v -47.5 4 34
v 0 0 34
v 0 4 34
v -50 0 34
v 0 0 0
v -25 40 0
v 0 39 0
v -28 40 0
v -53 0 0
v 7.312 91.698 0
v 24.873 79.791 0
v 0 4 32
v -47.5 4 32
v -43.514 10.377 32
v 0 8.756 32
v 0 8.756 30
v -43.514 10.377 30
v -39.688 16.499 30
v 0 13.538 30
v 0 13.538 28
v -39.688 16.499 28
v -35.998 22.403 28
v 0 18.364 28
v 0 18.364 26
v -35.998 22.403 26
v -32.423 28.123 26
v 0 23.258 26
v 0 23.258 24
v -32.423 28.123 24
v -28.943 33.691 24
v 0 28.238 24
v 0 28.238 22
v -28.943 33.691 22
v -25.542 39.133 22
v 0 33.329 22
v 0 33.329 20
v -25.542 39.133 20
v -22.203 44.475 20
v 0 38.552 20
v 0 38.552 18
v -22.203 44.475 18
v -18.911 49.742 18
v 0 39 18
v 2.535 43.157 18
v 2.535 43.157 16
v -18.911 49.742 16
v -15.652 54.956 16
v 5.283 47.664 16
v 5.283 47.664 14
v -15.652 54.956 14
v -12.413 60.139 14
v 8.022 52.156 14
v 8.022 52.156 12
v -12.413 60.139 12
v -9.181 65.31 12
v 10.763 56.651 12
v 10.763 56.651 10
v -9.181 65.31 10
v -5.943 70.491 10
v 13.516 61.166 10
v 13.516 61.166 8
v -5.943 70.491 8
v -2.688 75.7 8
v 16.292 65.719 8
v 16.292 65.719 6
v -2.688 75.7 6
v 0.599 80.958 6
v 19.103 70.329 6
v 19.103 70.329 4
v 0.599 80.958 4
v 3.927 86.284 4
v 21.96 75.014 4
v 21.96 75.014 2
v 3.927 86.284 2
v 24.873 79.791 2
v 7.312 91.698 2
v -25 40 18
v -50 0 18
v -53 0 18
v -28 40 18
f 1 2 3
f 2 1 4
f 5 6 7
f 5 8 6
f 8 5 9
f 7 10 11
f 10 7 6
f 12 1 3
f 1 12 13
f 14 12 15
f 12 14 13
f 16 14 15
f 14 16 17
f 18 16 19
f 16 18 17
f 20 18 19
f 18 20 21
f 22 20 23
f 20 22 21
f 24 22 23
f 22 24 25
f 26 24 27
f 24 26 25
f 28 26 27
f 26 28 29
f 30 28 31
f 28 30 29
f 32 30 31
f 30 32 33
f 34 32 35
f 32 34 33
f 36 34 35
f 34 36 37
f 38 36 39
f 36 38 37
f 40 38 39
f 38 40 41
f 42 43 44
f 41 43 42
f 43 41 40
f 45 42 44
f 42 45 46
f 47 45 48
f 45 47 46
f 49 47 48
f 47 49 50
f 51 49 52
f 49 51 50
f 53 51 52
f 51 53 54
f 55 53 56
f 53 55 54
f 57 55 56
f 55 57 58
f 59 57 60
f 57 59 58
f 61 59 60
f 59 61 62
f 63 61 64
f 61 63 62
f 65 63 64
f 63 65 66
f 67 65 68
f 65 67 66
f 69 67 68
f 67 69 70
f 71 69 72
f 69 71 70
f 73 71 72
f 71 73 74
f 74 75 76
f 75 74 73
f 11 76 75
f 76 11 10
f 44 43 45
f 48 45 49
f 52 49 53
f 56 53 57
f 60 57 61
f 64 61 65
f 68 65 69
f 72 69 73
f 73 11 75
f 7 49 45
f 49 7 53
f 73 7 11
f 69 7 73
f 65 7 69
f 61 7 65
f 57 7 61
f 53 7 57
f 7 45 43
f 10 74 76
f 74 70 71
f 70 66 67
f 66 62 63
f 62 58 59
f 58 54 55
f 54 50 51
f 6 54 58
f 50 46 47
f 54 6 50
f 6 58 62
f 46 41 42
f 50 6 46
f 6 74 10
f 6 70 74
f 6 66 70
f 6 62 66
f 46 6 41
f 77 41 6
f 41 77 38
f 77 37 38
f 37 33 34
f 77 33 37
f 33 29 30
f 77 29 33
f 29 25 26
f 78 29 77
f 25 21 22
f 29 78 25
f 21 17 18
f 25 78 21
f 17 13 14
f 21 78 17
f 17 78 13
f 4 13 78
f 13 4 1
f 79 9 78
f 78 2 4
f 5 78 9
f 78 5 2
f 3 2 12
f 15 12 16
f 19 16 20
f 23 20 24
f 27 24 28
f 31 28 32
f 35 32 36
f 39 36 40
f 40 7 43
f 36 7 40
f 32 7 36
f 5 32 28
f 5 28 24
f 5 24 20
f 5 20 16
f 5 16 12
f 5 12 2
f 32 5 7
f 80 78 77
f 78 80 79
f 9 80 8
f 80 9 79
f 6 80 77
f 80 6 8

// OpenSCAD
gap=0.3;
wid=25; 
lwid=50; 

deg=atan(50/80);
h=sin(deg)*25;
w=tan(deg)*h;
intersection() {
    color([1,1,1]) linear_extrude(34) polygon([[-50,0],[0,0],[0,39],[25,80],[w,80+h]]);
    union() for (ii=[0:16]) rotate([0,0,-ii*(deg/15)]) translate([0,ii*4.75,0]) translate([-50,-3,0]) cube([55,7,34-ii*2]);    
}
color([1,0,1]) linear_extrude(18) polygon([[-53,0],[-50,0],[-25,40],[-28,40]]);
